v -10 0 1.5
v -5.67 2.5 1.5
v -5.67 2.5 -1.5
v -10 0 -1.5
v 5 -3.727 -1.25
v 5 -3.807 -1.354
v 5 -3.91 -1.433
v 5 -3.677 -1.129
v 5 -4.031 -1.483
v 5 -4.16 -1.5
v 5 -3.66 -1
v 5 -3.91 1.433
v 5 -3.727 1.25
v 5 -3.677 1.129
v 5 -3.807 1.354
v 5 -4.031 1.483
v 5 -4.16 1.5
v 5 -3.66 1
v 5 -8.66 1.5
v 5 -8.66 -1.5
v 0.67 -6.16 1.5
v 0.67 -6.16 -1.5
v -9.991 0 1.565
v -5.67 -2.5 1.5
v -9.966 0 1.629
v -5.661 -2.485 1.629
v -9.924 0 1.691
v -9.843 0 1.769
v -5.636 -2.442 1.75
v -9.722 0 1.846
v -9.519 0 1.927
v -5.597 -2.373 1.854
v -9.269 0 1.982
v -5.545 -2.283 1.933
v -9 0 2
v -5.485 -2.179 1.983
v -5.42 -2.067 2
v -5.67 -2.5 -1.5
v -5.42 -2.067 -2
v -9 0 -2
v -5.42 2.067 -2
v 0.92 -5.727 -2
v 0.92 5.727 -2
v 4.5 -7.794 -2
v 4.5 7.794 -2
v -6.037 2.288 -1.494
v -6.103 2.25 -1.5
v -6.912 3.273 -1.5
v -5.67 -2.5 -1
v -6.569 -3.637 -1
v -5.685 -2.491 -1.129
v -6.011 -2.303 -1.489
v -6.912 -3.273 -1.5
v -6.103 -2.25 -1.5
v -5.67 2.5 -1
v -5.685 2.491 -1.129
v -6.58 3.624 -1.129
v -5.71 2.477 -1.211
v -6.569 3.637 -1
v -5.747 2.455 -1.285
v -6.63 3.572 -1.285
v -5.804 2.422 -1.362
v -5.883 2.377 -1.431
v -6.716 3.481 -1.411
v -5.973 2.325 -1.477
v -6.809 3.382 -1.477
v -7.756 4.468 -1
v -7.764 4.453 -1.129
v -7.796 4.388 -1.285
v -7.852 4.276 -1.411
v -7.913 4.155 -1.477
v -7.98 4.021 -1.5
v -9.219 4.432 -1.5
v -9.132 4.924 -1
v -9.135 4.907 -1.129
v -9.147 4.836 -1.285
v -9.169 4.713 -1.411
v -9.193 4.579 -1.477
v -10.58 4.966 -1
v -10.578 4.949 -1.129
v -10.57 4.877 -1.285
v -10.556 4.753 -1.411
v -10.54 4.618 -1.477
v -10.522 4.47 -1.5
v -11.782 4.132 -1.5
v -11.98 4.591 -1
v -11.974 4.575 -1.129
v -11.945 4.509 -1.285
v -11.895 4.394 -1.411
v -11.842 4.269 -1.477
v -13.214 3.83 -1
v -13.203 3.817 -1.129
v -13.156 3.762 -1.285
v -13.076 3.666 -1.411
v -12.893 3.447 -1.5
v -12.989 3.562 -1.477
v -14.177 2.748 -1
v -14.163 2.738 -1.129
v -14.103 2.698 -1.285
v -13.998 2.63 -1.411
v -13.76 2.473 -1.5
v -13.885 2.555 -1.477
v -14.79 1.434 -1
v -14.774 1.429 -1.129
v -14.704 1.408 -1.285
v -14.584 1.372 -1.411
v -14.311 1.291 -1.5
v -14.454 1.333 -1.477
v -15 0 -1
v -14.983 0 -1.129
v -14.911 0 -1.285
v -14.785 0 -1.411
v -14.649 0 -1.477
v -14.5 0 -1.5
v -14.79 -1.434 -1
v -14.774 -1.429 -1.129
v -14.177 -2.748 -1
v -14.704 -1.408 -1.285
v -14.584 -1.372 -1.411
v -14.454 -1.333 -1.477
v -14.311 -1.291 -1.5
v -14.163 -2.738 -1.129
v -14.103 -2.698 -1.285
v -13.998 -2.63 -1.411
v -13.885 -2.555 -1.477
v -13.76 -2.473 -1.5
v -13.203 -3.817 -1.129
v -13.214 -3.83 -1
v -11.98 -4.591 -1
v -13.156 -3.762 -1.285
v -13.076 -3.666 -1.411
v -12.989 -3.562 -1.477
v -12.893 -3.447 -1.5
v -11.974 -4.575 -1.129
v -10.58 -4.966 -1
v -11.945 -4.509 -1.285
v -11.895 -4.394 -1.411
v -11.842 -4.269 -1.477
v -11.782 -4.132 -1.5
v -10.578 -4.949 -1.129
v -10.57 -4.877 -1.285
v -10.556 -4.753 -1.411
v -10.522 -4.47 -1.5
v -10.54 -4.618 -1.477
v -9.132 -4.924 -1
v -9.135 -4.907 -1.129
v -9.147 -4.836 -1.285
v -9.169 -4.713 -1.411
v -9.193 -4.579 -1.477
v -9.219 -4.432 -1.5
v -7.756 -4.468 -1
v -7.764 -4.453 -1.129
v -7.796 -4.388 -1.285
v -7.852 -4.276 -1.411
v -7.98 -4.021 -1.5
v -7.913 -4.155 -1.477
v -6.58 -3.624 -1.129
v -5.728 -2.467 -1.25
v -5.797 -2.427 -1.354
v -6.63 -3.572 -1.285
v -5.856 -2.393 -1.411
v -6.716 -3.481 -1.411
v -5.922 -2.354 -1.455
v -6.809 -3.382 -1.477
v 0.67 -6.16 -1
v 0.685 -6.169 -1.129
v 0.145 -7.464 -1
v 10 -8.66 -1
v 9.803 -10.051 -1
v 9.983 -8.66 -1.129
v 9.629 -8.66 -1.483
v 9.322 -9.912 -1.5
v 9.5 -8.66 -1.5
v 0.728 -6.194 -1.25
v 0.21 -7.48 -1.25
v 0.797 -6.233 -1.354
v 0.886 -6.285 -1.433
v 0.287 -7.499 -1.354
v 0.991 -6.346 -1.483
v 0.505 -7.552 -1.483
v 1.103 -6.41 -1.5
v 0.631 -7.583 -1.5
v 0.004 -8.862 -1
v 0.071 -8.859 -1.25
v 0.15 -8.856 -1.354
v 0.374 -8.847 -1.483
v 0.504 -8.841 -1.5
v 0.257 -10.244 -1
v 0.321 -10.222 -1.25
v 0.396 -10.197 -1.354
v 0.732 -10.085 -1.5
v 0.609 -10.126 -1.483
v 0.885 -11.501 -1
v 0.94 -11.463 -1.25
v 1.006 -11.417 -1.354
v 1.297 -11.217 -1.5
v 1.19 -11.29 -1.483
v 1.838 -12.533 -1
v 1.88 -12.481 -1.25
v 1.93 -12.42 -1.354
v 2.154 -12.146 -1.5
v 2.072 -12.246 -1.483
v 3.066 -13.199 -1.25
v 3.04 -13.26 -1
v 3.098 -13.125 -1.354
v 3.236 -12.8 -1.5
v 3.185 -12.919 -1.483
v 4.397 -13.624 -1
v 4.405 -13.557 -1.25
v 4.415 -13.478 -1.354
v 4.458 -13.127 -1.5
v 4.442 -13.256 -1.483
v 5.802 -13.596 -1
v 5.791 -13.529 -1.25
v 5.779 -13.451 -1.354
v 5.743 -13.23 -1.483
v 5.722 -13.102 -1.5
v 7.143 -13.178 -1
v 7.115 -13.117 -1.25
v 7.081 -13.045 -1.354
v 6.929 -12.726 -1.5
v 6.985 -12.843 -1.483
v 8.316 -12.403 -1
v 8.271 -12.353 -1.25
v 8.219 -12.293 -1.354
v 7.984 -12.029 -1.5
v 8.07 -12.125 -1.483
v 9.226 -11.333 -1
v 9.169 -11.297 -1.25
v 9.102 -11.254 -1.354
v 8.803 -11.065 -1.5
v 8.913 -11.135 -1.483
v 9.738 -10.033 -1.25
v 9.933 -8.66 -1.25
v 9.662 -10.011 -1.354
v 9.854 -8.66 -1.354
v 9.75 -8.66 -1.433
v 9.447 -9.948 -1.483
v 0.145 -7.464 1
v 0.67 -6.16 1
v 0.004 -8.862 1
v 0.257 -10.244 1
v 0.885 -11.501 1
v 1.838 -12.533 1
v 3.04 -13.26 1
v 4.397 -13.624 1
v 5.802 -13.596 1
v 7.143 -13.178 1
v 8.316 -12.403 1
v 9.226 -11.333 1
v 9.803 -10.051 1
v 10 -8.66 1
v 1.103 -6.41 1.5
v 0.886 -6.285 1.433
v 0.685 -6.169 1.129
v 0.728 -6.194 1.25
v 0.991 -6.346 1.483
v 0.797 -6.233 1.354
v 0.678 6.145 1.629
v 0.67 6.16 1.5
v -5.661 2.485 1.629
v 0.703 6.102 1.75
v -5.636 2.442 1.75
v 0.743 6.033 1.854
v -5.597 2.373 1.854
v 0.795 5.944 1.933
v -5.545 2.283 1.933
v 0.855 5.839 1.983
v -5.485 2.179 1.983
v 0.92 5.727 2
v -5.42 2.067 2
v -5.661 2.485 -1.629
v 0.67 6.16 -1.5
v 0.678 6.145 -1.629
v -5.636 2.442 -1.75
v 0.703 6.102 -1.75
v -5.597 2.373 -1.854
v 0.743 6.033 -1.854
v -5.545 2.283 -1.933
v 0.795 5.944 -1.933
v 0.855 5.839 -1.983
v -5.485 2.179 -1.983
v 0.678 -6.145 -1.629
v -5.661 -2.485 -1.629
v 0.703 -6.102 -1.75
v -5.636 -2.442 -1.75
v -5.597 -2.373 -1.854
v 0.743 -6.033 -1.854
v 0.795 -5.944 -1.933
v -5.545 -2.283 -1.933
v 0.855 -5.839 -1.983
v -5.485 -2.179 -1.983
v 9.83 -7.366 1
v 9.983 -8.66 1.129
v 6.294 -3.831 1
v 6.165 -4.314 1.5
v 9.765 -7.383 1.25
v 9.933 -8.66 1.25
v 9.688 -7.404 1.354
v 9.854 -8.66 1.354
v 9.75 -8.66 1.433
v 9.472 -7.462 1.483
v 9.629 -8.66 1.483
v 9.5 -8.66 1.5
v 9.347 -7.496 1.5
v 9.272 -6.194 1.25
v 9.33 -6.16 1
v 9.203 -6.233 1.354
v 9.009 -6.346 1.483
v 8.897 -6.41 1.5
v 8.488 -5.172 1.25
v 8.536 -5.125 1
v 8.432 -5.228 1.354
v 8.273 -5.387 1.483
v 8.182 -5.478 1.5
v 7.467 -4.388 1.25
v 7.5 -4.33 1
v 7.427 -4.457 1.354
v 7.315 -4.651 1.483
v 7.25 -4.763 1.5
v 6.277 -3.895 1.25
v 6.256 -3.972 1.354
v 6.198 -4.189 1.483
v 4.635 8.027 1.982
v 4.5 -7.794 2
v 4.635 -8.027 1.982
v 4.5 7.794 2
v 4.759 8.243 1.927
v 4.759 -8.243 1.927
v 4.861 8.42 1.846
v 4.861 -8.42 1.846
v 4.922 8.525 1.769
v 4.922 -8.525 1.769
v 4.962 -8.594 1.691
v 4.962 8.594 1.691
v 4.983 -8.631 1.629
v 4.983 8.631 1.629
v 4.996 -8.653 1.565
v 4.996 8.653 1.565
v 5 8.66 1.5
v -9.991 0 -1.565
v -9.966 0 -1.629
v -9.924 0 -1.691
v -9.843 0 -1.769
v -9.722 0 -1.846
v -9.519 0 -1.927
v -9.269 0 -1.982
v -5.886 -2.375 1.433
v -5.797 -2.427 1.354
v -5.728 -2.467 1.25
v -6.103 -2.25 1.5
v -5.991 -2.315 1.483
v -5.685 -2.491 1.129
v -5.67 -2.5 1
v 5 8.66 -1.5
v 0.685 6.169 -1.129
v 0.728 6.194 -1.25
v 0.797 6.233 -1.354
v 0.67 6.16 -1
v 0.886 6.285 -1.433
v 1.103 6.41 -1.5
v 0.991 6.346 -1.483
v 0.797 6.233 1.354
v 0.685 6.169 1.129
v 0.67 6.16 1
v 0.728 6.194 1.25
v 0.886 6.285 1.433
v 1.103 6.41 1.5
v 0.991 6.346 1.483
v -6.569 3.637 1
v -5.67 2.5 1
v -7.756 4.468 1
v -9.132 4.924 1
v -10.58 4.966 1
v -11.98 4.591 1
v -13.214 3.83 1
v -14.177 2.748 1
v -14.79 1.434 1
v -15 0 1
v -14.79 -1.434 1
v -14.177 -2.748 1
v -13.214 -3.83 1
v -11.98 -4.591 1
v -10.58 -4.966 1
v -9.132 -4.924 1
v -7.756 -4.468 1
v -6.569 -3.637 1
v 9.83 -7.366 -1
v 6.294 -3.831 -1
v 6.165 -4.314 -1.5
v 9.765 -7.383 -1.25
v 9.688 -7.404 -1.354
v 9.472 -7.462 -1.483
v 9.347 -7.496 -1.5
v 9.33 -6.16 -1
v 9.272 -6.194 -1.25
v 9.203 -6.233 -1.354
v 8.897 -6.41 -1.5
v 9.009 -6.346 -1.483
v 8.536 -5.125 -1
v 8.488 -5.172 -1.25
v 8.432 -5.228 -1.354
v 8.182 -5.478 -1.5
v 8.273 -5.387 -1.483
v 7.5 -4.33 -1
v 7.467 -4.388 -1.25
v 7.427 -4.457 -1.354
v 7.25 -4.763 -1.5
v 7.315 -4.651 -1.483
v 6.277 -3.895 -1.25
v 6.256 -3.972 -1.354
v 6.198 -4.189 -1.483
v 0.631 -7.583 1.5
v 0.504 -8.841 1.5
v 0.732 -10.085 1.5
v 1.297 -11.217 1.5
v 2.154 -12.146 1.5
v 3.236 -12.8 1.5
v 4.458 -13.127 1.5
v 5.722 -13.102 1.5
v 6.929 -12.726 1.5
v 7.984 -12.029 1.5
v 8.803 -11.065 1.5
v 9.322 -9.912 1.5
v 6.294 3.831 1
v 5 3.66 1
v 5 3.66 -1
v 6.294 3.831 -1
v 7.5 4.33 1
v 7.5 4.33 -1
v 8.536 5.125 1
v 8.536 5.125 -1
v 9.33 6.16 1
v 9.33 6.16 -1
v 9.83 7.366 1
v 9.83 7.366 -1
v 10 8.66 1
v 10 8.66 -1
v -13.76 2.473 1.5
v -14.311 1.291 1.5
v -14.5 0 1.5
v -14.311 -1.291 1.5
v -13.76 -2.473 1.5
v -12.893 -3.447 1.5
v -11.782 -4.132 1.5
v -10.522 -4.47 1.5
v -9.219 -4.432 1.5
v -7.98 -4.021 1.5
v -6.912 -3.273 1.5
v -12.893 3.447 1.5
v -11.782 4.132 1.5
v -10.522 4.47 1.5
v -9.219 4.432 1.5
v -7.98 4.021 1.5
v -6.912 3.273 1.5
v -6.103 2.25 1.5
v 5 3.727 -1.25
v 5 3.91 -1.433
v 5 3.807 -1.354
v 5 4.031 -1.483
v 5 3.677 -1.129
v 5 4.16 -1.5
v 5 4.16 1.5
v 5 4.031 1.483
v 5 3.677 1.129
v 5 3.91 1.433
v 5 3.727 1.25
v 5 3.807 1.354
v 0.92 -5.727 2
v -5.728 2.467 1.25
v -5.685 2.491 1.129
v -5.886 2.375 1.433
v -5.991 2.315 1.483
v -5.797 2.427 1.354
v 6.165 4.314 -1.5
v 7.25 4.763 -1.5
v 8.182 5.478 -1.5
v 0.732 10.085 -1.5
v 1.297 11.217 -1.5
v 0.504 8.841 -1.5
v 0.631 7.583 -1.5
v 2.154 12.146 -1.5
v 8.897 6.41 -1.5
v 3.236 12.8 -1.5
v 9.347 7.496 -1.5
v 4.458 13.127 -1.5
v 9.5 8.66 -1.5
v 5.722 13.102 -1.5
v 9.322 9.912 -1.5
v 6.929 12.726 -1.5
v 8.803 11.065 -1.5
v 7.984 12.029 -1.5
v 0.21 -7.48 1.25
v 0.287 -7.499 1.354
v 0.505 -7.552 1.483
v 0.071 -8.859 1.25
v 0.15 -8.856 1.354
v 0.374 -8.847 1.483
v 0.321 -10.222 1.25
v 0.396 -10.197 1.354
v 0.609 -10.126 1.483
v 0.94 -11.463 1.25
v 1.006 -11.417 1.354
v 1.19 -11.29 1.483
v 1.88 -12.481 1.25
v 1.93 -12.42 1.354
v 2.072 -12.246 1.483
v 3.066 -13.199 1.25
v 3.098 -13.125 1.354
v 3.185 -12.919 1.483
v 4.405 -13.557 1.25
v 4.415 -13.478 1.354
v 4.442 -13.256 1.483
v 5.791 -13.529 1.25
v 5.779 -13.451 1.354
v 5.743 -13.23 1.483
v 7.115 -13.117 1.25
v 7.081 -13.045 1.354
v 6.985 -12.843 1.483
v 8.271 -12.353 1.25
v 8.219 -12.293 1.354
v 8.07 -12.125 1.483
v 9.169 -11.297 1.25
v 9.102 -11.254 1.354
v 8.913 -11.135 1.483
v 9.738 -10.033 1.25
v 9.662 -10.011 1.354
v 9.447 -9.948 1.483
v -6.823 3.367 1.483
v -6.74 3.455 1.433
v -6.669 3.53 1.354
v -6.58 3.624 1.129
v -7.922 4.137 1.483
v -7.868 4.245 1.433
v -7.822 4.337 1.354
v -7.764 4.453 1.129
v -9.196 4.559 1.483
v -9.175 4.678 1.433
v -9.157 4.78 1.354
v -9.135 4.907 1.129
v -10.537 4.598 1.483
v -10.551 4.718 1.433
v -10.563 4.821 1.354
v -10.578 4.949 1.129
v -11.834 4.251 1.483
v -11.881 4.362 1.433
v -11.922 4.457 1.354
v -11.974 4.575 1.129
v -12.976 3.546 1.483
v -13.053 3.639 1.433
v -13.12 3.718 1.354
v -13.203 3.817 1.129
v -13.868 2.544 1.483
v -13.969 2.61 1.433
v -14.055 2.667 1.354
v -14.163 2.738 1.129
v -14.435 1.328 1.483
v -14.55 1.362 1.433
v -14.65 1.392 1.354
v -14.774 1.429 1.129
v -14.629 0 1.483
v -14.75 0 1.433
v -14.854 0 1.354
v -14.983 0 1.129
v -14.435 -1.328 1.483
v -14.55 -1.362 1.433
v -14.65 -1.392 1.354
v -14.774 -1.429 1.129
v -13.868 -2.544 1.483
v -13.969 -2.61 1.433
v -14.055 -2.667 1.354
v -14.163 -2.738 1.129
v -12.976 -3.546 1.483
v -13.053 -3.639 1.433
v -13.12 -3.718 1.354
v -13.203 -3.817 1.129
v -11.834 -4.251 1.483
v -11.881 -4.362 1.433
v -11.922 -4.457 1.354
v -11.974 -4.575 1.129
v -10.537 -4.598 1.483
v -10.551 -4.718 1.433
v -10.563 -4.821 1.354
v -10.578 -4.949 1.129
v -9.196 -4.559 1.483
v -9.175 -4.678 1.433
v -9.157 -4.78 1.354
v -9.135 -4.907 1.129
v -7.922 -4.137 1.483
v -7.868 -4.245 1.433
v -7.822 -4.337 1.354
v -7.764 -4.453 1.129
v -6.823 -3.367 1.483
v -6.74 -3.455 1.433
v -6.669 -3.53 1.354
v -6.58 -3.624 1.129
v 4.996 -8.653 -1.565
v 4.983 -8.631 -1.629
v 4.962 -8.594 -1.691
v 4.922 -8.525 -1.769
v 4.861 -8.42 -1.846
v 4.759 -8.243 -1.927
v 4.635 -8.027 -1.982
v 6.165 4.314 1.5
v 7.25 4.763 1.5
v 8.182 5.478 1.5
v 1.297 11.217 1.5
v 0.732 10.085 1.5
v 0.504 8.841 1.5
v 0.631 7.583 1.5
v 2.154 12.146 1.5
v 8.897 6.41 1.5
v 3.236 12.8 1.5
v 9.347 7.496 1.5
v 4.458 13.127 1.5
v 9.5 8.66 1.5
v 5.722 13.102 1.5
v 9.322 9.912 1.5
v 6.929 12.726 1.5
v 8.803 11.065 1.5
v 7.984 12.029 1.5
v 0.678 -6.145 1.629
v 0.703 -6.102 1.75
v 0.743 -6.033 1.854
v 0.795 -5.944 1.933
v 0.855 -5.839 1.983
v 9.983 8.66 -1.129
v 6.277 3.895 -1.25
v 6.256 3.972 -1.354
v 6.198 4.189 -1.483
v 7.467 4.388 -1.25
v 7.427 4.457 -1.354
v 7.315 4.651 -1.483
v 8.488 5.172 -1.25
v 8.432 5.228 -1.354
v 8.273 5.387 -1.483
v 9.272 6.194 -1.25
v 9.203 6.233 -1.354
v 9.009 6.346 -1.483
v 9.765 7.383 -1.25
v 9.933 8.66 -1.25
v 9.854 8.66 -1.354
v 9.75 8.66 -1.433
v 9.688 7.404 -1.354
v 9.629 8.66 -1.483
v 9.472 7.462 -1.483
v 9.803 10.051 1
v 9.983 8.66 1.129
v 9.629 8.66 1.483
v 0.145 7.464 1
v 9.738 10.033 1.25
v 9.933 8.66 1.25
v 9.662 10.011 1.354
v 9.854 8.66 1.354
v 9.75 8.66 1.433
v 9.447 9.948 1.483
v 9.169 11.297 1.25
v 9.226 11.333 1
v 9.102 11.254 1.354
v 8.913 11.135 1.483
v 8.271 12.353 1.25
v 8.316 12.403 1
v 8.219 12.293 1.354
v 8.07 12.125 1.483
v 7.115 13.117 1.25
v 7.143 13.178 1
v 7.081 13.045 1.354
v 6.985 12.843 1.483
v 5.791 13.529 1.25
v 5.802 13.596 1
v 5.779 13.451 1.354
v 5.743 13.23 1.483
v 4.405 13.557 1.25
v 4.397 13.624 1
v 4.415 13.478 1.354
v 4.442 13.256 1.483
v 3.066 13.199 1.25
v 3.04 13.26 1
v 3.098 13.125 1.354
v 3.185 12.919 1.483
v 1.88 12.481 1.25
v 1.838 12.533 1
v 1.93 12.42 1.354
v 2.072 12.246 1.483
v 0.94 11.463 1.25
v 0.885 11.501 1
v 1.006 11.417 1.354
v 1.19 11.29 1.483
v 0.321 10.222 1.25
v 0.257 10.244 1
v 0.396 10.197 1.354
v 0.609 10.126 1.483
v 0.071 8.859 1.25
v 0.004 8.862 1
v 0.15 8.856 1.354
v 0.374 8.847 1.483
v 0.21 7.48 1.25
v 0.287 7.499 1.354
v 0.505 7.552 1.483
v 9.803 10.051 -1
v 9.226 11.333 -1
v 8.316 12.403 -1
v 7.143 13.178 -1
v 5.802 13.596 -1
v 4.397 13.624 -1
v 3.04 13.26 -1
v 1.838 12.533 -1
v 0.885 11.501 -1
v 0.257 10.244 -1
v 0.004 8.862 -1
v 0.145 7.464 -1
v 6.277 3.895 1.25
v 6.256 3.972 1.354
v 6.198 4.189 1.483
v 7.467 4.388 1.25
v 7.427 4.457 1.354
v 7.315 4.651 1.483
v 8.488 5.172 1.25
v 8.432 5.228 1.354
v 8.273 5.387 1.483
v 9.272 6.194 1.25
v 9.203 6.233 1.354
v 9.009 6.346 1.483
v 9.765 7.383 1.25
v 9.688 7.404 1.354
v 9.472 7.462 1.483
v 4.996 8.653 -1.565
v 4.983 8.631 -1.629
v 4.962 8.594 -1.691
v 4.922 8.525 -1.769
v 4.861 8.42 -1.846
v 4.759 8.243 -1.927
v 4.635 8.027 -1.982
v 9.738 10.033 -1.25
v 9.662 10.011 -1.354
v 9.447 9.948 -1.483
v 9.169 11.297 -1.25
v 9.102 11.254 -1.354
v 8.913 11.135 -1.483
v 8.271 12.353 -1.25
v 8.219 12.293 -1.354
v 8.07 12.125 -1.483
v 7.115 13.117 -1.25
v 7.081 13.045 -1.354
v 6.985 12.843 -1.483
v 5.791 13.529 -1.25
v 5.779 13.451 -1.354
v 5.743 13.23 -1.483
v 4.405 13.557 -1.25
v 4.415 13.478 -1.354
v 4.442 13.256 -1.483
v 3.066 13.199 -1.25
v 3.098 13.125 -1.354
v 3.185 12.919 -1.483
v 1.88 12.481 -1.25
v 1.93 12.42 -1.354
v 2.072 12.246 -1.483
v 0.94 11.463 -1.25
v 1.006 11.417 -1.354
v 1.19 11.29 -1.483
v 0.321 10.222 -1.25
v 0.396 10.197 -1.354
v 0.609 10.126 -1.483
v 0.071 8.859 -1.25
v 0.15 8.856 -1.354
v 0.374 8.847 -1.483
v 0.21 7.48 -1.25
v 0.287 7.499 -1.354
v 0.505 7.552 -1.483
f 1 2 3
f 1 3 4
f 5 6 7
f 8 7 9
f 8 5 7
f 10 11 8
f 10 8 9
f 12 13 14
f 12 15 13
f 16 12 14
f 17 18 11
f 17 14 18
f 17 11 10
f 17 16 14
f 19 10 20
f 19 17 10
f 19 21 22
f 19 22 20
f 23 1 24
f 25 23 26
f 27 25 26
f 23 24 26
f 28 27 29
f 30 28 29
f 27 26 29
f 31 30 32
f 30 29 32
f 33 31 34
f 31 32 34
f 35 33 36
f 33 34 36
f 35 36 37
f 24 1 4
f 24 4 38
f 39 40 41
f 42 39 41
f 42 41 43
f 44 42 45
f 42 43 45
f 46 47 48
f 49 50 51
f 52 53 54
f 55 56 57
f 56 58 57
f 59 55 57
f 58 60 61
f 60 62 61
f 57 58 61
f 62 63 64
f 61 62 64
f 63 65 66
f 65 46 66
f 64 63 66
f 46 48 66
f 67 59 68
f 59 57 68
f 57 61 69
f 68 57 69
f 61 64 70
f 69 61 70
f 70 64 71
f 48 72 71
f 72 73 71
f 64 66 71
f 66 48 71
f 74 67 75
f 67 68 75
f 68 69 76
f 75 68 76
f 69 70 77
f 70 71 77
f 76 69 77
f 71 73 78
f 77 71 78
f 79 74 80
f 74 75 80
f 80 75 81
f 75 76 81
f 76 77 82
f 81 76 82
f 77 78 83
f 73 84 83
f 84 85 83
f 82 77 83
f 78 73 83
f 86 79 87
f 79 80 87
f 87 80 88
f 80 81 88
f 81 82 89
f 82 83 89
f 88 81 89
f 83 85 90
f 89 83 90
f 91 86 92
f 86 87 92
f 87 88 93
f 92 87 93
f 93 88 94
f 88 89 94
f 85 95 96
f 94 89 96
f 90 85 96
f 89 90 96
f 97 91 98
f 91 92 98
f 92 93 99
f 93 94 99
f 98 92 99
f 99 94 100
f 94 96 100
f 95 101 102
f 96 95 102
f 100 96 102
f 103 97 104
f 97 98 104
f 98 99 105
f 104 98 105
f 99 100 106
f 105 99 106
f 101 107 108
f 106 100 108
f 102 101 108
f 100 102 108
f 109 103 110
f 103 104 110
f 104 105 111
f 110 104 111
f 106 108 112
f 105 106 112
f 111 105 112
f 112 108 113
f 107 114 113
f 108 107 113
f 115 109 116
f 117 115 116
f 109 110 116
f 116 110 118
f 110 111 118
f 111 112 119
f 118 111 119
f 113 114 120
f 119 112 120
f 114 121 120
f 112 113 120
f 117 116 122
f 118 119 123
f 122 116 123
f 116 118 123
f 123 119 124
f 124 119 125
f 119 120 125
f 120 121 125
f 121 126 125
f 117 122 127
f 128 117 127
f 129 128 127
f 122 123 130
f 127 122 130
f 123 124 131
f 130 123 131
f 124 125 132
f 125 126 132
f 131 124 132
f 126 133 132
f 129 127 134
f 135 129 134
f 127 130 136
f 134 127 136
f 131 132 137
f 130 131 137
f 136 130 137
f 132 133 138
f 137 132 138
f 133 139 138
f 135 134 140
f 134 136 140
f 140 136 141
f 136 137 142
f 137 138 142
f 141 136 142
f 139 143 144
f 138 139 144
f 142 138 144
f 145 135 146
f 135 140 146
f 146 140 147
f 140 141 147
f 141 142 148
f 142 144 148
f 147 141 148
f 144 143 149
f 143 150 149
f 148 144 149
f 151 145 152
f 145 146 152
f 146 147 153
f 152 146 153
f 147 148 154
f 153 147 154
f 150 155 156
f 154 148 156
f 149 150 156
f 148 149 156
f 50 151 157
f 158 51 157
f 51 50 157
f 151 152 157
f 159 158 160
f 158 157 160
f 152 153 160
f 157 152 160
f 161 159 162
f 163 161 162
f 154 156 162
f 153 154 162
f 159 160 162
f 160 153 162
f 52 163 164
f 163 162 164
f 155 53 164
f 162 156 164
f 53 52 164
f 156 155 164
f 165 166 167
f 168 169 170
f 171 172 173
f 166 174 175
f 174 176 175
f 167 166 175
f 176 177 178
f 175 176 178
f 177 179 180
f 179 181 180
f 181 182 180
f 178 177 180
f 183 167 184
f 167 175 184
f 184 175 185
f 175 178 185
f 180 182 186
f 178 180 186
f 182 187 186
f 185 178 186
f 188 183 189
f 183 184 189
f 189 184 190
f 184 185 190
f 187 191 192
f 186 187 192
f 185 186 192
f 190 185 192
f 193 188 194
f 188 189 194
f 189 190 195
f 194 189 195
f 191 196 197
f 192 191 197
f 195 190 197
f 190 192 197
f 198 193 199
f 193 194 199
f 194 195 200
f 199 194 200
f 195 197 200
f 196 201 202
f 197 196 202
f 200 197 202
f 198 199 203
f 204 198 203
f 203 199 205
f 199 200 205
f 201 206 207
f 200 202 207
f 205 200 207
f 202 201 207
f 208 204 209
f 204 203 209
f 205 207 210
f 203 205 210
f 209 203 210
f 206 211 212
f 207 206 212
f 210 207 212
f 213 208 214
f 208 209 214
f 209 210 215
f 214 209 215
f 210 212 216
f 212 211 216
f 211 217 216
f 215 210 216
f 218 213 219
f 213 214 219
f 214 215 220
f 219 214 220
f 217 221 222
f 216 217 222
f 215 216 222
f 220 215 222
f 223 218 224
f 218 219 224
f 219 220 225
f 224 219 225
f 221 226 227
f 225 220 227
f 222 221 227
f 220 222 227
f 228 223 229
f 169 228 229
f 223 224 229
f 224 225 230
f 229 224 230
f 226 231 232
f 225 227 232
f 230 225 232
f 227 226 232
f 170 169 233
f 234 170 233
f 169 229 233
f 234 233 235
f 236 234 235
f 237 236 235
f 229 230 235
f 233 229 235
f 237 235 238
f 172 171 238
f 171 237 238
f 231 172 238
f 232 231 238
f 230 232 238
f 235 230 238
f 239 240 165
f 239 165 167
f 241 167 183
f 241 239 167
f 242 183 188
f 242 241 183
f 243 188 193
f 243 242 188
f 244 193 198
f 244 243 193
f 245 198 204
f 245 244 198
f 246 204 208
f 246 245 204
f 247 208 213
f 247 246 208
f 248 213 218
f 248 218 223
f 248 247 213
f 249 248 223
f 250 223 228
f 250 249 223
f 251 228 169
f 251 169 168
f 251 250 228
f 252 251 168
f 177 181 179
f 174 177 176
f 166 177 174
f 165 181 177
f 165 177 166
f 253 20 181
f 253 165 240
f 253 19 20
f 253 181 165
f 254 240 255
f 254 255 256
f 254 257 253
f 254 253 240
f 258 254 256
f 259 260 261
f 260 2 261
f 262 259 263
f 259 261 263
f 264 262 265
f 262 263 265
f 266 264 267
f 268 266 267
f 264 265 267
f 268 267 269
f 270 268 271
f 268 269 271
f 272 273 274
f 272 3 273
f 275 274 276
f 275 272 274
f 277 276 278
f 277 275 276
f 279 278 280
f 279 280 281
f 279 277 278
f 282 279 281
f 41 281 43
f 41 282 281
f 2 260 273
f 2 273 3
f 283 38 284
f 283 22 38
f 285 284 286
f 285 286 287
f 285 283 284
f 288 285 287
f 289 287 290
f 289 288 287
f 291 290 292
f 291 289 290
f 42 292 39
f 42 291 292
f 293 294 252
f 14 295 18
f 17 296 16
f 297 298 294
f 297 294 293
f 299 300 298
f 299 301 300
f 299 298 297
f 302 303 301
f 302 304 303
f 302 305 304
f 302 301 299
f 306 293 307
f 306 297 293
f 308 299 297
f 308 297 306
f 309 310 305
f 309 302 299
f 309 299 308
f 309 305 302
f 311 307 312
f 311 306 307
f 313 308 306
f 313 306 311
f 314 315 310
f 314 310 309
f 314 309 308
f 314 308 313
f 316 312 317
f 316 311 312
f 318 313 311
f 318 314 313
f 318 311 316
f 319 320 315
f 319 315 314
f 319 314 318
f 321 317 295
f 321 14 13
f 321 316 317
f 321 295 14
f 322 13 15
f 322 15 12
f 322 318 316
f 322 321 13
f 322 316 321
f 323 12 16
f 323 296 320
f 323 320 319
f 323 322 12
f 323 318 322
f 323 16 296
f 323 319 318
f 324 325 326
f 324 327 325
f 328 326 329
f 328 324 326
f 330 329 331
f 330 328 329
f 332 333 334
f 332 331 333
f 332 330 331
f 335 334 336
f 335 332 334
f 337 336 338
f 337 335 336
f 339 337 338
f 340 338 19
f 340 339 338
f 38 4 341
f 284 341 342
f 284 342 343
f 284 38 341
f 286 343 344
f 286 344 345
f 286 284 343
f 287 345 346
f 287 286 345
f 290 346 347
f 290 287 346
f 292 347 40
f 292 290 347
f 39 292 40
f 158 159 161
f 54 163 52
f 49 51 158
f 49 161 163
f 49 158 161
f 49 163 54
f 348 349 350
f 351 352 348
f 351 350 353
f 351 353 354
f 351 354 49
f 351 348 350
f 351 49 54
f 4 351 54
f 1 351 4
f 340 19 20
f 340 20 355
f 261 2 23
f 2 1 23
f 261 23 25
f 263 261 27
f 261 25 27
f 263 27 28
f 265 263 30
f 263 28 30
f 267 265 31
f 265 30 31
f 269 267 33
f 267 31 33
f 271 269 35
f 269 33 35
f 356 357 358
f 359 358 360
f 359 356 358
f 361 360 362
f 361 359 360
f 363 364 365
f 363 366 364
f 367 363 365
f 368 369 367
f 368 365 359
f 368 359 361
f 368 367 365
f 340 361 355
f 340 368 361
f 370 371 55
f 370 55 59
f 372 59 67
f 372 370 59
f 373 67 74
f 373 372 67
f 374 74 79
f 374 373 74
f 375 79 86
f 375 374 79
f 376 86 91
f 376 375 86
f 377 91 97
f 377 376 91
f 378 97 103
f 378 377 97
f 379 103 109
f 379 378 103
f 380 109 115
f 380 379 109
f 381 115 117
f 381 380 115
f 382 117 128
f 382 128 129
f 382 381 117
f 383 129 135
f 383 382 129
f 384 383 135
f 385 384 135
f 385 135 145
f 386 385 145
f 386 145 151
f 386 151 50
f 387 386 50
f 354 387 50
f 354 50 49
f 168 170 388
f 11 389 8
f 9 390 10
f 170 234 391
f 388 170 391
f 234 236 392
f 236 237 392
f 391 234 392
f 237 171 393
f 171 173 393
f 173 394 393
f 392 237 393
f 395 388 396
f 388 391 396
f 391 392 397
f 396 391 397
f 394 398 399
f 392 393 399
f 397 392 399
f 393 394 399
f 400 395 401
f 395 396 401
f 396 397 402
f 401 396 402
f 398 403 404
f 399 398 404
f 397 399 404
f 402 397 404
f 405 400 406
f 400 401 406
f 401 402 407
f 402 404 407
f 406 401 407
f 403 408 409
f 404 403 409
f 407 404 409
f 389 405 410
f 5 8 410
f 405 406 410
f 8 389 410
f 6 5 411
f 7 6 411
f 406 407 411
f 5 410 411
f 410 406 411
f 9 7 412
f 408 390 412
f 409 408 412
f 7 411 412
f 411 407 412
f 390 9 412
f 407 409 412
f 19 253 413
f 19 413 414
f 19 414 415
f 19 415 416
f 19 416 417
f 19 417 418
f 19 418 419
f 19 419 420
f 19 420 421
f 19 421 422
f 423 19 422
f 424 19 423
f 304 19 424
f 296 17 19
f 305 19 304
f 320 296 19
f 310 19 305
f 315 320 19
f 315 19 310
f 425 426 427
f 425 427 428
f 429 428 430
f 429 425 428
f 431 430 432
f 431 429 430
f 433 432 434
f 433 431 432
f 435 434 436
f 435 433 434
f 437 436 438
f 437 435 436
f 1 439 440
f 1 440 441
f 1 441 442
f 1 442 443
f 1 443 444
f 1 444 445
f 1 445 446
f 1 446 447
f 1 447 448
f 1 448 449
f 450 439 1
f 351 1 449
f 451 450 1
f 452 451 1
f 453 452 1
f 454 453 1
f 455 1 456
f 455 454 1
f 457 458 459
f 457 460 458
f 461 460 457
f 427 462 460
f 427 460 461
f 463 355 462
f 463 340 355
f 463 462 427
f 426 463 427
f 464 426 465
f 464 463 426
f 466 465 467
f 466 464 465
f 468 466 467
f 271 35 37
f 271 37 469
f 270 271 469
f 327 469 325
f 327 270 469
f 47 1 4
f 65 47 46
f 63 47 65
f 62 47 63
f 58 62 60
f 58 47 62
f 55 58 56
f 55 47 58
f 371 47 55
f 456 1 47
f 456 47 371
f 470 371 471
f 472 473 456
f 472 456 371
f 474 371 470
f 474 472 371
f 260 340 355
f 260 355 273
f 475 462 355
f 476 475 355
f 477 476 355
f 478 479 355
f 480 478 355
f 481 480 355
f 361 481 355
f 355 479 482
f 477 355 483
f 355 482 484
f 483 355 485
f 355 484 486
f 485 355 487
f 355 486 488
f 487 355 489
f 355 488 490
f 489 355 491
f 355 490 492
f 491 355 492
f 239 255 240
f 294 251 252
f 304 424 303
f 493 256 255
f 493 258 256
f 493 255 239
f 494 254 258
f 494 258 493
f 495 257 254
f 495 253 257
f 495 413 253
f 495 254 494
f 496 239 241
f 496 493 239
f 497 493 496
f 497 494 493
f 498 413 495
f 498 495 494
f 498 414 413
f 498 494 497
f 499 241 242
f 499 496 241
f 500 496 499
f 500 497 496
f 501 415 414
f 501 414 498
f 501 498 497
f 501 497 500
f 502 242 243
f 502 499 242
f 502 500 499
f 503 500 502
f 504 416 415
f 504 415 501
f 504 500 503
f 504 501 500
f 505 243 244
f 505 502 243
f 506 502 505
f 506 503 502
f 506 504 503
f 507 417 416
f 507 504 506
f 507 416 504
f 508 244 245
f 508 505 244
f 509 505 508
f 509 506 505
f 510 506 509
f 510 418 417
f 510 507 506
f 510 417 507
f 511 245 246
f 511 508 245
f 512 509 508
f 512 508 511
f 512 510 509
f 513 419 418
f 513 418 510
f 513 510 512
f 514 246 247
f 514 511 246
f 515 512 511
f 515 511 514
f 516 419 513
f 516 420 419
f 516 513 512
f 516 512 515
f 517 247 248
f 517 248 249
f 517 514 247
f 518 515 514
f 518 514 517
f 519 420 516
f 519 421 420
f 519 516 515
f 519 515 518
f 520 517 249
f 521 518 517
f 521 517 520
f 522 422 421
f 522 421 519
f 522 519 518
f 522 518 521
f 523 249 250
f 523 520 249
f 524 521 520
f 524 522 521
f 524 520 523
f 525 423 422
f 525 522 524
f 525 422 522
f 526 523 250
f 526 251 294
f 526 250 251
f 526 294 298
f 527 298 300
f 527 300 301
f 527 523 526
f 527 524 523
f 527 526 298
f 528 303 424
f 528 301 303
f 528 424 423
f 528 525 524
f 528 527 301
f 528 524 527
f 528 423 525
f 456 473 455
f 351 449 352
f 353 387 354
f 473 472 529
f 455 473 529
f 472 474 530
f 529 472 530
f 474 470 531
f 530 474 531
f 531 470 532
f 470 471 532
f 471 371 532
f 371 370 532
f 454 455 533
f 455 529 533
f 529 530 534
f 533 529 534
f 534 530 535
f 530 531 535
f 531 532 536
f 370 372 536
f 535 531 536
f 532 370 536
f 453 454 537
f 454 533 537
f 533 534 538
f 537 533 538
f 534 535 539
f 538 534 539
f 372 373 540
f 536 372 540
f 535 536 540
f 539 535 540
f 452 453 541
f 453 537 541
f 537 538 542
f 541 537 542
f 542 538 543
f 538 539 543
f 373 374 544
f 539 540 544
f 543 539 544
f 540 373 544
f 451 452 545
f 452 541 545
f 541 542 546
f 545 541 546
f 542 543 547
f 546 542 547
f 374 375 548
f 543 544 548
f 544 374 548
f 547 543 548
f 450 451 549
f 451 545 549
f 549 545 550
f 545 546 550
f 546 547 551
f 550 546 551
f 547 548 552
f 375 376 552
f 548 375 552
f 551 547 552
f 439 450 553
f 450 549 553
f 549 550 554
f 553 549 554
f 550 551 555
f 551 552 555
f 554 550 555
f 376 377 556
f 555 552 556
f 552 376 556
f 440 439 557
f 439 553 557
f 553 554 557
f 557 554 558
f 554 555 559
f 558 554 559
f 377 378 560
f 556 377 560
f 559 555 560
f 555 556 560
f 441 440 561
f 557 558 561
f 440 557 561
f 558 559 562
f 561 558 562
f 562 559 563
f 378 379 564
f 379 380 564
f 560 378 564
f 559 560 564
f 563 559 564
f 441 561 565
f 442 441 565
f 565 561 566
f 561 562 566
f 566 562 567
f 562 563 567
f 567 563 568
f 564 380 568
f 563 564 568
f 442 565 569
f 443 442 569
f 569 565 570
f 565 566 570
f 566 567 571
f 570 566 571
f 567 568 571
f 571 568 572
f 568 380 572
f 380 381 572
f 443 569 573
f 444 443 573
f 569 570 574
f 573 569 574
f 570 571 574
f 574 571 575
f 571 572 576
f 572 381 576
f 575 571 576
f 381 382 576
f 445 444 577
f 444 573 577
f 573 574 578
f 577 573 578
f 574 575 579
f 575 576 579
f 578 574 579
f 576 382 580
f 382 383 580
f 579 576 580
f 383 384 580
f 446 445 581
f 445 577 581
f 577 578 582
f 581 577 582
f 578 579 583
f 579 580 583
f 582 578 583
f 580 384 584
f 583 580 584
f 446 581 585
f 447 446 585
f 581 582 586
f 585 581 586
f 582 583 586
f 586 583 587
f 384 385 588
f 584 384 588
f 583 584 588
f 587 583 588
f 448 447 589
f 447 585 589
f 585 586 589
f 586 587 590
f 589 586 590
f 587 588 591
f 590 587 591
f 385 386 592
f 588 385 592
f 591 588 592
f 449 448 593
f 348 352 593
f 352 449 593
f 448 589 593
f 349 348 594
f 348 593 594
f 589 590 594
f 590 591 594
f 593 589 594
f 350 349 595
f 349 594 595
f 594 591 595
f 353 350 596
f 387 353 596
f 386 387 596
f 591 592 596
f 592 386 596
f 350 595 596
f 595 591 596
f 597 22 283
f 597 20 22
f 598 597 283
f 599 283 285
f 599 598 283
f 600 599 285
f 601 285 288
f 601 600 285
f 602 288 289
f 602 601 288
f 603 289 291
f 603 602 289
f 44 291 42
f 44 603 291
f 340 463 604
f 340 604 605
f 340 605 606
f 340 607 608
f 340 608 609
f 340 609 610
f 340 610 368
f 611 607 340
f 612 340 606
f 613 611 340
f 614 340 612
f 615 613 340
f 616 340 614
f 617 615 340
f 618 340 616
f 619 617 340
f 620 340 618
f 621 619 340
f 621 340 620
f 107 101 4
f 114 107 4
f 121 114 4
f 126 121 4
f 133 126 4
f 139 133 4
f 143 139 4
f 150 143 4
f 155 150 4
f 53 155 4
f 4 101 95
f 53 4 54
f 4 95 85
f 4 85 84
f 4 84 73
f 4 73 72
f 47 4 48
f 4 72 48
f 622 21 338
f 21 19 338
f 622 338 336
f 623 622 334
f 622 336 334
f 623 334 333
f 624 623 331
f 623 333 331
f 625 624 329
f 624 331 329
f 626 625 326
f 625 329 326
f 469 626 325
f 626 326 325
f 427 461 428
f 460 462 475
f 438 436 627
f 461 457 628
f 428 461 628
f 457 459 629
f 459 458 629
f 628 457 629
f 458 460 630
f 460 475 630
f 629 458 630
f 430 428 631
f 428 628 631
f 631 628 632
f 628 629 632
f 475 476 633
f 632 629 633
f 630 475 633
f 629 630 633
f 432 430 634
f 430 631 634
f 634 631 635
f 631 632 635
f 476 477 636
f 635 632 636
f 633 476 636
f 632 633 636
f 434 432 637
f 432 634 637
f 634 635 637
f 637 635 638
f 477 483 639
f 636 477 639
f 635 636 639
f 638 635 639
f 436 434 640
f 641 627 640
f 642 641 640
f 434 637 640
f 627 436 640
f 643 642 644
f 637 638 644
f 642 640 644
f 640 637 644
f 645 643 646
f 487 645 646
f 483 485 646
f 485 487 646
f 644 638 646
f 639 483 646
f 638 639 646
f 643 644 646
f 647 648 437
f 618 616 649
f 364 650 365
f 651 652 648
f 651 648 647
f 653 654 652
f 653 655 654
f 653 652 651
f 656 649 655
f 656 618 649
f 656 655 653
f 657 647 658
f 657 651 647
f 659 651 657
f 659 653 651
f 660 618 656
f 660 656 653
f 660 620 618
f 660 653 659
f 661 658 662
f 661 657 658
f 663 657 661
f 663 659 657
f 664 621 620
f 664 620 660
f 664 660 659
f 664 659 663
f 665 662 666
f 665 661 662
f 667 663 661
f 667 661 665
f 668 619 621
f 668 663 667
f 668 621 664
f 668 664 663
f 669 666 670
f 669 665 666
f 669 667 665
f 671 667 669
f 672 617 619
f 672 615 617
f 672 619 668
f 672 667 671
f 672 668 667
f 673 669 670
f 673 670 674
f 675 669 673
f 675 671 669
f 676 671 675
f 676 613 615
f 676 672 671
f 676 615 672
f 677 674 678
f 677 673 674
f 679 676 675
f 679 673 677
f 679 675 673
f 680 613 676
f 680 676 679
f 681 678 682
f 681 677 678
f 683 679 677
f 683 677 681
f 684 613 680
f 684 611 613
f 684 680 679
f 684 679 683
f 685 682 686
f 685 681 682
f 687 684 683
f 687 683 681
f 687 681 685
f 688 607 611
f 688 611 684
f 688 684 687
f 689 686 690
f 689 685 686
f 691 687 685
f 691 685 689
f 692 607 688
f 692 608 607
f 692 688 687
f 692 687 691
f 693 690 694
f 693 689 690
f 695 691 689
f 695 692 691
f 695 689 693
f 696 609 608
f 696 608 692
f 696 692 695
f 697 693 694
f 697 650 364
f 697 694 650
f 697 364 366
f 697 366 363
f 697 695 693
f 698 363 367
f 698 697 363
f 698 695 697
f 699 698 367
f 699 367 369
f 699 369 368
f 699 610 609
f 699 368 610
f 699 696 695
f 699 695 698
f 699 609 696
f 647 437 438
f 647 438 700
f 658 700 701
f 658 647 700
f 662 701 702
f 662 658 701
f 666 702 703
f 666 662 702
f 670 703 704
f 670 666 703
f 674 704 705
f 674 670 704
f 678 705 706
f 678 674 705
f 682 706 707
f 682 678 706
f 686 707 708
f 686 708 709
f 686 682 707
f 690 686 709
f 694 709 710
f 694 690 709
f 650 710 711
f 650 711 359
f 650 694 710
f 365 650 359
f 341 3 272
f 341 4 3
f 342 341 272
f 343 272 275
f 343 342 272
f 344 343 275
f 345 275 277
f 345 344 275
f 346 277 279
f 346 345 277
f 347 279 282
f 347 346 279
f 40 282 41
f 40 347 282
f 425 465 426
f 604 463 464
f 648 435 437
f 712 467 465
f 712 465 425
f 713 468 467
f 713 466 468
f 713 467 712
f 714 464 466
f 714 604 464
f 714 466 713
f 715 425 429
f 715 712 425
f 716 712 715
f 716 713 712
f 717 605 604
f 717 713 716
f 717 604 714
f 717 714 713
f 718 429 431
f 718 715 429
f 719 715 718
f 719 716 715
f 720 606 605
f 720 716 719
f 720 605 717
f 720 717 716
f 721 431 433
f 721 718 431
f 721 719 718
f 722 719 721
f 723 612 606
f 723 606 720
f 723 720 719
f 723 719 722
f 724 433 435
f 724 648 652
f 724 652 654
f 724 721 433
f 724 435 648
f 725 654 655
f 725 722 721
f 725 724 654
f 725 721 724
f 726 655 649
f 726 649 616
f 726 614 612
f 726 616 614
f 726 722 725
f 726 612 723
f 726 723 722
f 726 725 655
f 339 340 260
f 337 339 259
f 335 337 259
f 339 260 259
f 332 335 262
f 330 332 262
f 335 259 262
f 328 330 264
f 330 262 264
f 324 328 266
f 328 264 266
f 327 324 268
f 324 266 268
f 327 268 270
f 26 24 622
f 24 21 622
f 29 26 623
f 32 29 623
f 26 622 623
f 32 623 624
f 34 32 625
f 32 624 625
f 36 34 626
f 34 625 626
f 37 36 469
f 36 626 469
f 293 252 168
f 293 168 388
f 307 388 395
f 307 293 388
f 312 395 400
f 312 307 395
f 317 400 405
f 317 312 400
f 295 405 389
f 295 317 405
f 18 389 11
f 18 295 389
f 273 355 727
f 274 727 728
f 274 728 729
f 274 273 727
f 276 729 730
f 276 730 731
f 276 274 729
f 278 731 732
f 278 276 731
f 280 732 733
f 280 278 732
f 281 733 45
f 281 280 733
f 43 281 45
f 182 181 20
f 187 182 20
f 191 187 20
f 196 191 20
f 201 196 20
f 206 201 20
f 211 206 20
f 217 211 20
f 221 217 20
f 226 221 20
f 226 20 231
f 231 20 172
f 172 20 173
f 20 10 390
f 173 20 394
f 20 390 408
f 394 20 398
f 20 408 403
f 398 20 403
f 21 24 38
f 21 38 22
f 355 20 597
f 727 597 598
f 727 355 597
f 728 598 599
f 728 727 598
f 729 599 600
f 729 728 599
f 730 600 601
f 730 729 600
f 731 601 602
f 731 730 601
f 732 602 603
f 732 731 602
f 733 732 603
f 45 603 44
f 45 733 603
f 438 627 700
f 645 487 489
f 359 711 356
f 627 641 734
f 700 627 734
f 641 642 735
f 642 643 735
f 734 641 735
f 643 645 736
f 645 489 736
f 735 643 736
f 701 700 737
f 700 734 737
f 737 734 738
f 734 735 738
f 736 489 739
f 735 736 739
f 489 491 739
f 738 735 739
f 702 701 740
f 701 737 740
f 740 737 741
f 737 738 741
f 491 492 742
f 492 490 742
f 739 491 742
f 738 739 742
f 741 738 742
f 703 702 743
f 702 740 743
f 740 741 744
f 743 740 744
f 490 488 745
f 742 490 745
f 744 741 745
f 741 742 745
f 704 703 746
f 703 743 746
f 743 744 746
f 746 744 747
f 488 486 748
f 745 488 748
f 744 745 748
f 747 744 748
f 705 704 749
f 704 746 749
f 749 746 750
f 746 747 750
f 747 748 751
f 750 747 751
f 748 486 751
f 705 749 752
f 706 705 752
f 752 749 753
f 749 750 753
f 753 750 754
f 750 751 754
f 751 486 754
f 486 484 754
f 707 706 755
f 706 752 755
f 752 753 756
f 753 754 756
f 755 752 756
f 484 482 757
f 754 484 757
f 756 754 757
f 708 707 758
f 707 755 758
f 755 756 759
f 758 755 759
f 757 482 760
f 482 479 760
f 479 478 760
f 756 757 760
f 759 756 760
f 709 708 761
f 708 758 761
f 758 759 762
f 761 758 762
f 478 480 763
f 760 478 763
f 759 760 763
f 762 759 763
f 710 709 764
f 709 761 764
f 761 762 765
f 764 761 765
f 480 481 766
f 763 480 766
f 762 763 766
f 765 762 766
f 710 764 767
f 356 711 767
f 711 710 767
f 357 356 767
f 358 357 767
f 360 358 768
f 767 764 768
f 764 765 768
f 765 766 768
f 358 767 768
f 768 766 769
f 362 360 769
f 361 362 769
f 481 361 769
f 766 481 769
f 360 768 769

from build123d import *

# Parameters (mm, degrees)
F1_DEPTH      = 2
F1_DEPTH_BACK = 2
F2_DEPTH      = 1.5
F2_DEPTH_BACK = 1.5
F3_R          = 0.5
F3_2_R        = 0.5


with BuildPart() as f1:
    # F0 (on Top) → F1 (new body, two sides)
    with BuildSketch(Plane.XY) as f1_sk:
        with BuildLine():
            ThreePointArc((-5.669873, -2.5), (-5.170371, -1.294095), (-5, 0))
            ThreePointArc((-5, 0), (-5.170371, 1.294095), (-5.669873, 2.5))
            Line((-5.669873, 2.5), (-10, 0))
            Line((-10, 0), (-5.669873, -2.5))
        make_face()
        with BuildLine():
            ThreePointArc((-5, 0), (-4.330127, 2.5), (-2.5, 4.330127))
            Line((-2.5, 4.330127), (-5.669873, 2.5))
            ThreePointArc((-5.669873, 2.5), (-5.170371, 1.294095), (-5, 0))
        make_face()
        with BuildLine():
            ThreePointArc((5, -3.660254), (3.705905, -3.830625), (2.5, -4.330127))
            ThreePointArc((2.5, -4.330127), (1.464466, -5.12472), (0.669873, -6.160254))
            Line((0.669873, -6.160254), (5, -8.660254))
            Line((5, -8.660254), (5, -3.660254))
        make_face()
        with BuildLine():
            ThreePointArc((2.5, 4.330127), (4.330127, 2.5), (5, 0))
            Line((5, 0), (5, 3.660254))
            ThreePointArc((5, 3.660254), (3.705905, 3.830625), (2.5, 4.330127))
        make_face()
        with BuildLine():
            ThreePointArc((-2.5, 4.330127), (0, 5), (2.5, 4.330127))
            ThreePointArc((2.5, 4.330127), (1.464466, 5.12472), (0.669873, 6.160254))
            Line((0.669873, 6.160254), (-2.5, 4.330127))
        make_face()
        with BuildLine():
            ThreePointArc((0.669873, -6.160254), (1.464466, -5.12472), (2.5, -4.330127))
            ThreePointArc((2.5, -4.330127), (0, -5), (-2.5, -4.330127))
            Line((-2.5, -4.330127), (0.669873, -6.160254))
        make_face()
        with BuildLine():
            Line((5, -3.660254), (5, 0))
            ThreePointArc((5, 0), (4.330127, -2.5), (2.5, -4.330127))
            ThreePointArc((2.5, -4.330127), (3.705905, -3.830625), (5, -3.660254))
        make_face()
        with BuildLine():
            ThreePointArc((2.5, -4.330127), (4.330127, -2.5), (5, 0))
            ThreePointArc((5, 0), (4.330127, 2.5), (2.5, 4.330127))
            ThreePointArc((2.5, 4.330127), (0, 5), (-2.5, 4.330127))
            ThreePointArc((-2.5, 4.330127), (-4.330127, 2.5), (-5, 0))
            ThreePointArc((-5, 0), (-4.330127, -2.5), (-2.5, -4.330127))
            ThreePointArc((-2.5, -4.330127), (0, -5), (2.5, -4.330127))
        make_face()
        with BuildLine():
            ThreePointArc((0.669873, 6.160254), (1.464466, 5.12472), (2.5, 4.330127))
            ThreePointArc((2.5, 4.330127), (3.705905, 3.830625), (5, 3.660254))
            Line((5, 3.660254), (5, 8.660254))
            Line((5, 8.660254), (0.669873, 6.160254))
        make_face()
        with BuildLine():
            Line((-5.669873, -2.5), (-2.5, -4.330127))
            ThreePointArc((-2.5, -4.330127), (-4.330127, -2.5), (-5, 0))
            ThreePointArc((-5, 0), (-5.170371, -1.294095), (-5.669873, -2.5))
        make_face()
    extrude(amount=F1_DEPTH)
    extrude(f1_sk.sketch, amount=-F1_DEPTH_BACK)

    # F3
    f3_edges = [f1.edges().sort_by_distance(p)[0] for p in [
        (-2.5, 4.330127, 2),
        (-2.5, -4.330127, 2),
        (5, 0, 2),
        (5, 0, -2),
        (-2.5, -4.330127, -2),
        (-2.5, 4.330127, -2),
    ]]
    fillet(f3_edges, radius=F3_R)


with BuildPart() as f2:
    # F0 (on Top) → F2 (new body, two sides)
    with BuildSketch(Plane.XY) as f2_sk:
        with BuildLine():
            ThreePointArc((10, -8.660254), (8.535534, -5.12472), (5, -3.660254))
            Line((5, -3.660254), (5, -8.660254))
            Line((5, -8.660254), (0.669873, -6.160254))
            ThreePointArc((0.669873, -6.160254), (3.705905, -13.489883), (10, -8.660254))
        make_face()
        with BuildLine():
            Line((-10, 0), (-5.669873, 2.5))
            ThreePointArc((-5.669873, 2.5), (-15, 0), (-5.669873, -2.5))
            Line((-5.669873, -2.5), (-10, 0))
        make_face()
        with BuildLine():
            Line((5, 8.660254), (5, 3.660254))
            ThreePointArc((5, 3.660254), (8.535534, 5.12472), (10, 8.660254))
            ThreePointArc((10, 8.660254), (3.705905, 13.489883), (0.669873, 6.160254))
            Line((0.669873, 6.160254), (5, 8.660254))
        make_face()
    extrude(amount=F2_DEPTH)
    extrude(f2_sk.sketch, amount=-F2_DEPTH_BACK)

    # F3#2
    f3_2_edges = [f2.edges().sort_by_distance(p)[0] for p in [
        (7.5, 12.990381, 1.5),
        (7.5, 12.990381, -1.5),
        (3.705905, -13.489883, 1.5),
        (3.705905, -13.489883, -1.5),
        (-15, 0, -1.5),
        (-15, 0, 1.5),
    ]]
    fillet(f3_2_edges, radius=F3_2_R)


solid = Compound([f1.part, f2.part])
